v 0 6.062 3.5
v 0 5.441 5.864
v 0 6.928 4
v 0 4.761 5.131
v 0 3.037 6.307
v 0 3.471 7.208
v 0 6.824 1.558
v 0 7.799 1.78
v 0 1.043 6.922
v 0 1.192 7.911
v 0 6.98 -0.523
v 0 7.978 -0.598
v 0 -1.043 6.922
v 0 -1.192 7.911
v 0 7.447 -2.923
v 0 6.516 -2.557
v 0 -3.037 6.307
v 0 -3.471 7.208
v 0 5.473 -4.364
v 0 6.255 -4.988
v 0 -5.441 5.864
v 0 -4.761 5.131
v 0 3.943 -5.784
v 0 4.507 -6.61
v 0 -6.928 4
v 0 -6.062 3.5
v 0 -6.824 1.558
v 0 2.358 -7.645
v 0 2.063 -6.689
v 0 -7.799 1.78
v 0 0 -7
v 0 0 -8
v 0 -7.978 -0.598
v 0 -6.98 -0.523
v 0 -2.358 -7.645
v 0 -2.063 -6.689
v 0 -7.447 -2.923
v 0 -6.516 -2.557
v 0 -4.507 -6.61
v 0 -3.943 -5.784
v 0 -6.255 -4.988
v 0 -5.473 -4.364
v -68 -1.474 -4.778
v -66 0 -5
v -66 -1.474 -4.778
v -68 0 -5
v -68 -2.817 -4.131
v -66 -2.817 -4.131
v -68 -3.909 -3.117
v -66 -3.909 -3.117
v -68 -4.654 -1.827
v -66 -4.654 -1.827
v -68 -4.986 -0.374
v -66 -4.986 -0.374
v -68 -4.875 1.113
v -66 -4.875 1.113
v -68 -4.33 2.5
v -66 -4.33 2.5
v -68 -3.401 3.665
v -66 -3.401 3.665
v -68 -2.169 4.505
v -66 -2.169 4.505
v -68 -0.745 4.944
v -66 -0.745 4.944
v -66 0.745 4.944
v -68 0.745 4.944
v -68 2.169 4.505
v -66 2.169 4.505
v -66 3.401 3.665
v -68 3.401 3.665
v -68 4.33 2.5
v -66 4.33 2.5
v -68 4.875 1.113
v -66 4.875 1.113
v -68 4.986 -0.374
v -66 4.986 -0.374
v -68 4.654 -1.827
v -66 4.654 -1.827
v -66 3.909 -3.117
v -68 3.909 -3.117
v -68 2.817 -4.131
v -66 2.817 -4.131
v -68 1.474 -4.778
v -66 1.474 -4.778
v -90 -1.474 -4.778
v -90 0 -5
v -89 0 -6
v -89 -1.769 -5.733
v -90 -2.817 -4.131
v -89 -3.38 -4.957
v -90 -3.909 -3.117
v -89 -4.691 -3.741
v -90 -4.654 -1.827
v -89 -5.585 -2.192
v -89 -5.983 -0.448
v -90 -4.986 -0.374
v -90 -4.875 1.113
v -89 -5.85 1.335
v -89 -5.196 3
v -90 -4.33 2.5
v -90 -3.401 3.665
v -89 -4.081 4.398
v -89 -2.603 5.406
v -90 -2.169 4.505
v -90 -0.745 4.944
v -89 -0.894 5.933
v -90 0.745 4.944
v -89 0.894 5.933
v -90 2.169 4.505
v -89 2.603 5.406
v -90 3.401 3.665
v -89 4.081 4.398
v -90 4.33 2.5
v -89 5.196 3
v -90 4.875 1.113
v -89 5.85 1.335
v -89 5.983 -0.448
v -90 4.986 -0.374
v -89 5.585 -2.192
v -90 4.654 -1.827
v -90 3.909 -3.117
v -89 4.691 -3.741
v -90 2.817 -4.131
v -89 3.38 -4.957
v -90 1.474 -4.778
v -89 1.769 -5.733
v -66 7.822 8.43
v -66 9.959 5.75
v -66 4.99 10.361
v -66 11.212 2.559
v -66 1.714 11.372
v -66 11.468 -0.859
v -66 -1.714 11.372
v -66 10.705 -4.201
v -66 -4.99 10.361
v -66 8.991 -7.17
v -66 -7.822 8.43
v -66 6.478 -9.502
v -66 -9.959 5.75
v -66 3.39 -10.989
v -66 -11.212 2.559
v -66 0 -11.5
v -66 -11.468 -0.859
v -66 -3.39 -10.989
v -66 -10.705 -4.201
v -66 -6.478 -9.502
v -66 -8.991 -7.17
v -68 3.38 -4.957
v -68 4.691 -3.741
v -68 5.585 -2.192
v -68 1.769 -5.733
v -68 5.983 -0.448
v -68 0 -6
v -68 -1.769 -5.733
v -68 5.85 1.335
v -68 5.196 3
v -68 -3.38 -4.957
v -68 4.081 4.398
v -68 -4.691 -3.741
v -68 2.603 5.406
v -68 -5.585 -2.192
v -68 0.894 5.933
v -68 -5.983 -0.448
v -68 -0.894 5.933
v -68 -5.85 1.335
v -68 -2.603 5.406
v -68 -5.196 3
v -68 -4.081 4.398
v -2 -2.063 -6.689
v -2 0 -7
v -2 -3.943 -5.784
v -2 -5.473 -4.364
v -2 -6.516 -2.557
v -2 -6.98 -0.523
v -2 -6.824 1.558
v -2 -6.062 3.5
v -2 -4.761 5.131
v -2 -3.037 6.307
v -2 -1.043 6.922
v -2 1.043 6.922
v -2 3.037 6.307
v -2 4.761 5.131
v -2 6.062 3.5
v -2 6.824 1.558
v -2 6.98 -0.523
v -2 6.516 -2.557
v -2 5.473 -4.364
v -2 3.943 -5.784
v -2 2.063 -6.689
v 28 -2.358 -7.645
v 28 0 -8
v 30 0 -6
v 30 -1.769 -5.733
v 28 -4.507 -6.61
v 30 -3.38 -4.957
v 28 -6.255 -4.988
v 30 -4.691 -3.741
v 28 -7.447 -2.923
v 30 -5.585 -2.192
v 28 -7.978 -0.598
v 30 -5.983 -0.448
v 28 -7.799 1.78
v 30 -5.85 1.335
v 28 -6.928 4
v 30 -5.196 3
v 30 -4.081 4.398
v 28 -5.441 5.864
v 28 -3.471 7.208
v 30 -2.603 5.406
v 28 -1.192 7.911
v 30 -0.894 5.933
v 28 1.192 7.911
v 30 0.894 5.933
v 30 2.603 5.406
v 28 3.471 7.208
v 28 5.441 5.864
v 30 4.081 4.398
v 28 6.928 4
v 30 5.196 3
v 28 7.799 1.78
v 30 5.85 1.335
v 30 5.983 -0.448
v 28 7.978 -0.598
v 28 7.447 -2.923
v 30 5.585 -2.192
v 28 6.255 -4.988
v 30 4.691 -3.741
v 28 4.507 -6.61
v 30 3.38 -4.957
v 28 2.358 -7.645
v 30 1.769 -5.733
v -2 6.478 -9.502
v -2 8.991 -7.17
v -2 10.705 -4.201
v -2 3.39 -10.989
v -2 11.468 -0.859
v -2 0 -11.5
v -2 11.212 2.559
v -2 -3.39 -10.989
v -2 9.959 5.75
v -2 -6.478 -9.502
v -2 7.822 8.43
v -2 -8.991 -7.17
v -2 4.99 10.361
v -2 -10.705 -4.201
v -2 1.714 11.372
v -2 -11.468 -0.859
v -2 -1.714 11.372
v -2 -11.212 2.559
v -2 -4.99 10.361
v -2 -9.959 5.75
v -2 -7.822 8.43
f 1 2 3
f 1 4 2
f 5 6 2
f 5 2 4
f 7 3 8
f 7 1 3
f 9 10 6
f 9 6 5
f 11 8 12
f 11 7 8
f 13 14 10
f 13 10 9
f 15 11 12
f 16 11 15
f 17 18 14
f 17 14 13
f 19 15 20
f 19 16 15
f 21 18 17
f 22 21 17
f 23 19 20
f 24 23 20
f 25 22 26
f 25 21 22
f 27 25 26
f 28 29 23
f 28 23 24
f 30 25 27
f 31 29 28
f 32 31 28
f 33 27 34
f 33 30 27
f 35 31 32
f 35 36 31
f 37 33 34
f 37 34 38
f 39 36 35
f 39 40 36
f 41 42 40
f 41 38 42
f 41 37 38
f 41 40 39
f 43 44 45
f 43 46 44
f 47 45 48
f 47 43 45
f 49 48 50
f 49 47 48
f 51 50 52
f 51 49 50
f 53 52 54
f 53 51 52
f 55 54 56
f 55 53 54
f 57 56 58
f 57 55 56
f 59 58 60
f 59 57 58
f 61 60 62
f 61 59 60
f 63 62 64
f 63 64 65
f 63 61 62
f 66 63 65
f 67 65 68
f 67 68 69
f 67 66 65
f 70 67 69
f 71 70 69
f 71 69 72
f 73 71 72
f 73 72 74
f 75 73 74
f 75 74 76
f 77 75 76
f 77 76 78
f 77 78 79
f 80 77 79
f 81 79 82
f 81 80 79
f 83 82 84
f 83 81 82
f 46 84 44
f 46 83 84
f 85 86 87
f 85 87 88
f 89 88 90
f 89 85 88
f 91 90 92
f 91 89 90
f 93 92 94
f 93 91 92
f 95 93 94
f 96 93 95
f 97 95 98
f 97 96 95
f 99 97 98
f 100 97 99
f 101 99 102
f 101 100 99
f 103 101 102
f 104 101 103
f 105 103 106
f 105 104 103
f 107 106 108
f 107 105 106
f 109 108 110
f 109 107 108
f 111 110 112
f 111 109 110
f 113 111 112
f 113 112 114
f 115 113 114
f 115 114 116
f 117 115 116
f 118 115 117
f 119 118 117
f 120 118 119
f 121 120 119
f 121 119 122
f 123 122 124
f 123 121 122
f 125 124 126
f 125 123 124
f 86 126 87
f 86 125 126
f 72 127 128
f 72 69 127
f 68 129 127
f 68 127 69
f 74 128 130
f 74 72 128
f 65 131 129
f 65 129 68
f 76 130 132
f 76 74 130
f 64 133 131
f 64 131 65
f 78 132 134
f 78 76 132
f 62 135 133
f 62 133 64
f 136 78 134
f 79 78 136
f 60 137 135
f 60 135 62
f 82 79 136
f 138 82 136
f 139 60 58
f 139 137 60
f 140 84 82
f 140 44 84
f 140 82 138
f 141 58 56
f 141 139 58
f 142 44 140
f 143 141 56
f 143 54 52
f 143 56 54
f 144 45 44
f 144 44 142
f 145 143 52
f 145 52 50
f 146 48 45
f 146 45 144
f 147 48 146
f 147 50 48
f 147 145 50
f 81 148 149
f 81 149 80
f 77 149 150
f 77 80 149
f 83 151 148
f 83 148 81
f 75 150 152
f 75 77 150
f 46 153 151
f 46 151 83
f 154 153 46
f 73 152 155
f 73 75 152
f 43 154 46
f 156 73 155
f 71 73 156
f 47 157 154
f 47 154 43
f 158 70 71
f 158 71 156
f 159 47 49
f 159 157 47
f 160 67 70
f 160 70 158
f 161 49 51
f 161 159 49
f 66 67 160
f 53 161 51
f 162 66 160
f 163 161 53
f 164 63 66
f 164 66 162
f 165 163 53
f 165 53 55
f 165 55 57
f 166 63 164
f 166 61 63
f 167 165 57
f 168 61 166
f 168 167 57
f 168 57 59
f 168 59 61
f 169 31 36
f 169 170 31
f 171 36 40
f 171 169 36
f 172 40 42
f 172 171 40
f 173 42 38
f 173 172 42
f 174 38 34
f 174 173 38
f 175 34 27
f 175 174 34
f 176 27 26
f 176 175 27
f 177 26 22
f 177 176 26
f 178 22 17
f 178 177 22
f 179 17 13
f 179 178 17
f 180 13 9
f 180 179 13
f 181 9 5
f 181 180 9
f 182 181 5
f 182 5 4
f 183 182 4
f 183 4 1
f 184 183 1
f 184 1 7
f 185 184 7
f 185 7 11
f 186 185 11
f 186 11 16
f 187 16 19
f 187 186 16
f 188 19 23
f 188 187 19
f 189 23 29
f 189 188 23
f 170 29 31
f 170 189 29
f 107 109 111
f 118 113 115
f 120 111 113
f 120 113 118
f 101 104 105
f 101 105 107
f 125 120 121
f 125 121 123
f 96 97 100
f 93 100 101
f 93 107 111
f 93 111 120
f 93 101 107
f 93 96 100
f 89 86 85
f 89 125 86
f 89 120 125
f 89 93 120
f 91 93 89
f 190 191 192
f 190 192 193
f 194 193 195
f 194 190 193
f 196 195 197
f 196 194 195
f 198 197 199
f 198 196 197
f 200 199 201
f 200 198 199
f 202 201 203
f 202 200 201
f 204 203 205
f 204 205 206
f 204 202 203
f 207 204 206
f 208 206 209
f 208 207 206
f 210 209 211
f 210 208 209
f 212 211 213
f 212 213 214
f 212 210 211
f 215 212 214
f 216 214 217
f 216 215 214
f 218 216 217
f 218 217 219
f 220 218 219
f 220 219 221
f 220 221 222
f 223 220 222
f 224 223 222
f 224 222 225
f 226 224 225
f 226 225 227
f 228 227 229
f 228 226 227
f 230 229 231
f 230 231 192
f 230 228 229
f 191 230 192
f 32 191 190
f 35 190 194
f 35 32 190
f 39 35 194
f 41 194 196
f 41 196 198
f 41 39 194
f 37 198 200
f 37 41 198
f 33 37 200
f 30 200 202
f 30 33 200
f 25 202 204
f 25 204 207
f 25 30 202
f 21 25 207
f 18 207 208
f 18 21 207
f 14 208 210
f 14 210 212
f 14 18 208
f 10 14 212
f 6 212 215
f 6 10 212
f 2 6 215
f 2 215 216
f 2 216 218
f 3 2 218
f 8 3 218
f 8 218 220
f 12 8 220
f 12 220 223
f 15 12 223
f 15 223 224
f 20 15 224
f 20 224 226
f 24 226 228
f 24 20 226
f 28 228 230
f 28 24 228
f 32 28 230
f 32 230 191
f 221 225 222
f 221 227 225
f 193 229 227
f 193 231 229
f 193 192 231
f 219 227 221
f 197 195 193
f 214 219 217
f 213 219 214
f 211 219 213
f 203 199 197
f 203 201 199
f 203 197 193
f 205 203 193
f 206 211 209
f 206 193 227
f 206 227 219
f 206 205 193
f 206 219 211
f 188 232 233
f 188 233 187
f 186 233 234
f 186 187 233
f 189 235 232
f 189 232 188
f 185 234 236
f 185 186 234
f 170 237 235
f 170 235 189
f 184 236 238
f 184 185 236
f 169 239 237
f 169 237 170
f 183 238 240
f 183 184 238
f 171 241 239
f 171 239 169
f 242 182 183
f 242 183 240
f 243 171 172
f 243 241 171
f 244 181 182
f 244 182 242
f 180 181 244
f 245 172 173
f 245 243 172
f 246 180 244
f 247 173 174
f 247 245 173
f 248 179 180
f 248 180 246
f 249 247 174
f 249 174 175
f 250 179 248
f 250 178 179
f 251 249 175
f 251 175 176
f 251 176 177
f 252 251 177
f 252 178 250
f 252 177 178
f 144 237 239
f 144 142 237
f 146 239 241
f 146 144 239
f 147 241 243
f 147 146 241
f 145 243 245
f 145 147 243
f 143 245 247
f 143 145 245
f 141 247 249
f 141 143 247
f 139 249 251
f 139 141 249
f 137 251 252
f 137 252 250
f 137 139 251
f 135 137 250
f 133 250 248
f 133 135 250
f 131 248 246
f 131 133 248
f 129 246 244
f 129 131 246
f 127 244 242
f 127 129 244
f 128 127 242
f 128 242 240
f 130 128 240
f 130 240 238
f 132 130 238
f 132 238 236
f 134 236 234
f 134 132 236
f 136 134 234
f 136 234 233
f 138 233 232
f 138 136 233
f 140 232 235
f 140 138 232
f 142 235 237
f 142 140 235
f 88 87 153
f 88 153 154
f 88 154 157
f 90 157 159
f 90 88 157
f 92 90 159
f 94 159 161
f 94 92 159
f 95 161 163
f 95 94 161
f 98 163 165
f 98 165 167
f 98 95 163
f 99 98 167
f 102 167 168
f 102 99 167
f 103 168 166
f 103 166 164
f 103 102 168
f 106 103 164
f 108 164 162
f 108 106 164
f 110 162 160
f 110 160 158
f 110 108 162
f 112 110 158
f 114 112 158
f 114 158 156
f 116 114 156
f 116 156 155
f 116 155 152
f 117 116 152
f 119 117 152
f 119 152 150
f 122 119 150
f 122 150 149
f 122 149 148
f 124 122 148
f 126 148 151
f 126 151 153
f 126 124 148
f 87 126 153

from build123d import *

# Parameters (mm, degrees)
CHAMFER1_SIZE = 2
CHAMFER2_SIZE = 1


with BuildPart() as part:
    # Sketch1 → Revolve1 (revolve)
    with BuildSketch(Plane.XY, mode=Mode.PRIVATE) as revolve1_sk:
        Polygon((0, 0), (30, 0), (30, 8), (0, 8), (0, 7), (-2, 7), (-2, 11.5), (-66, 11.5), (-66, 5), (-68, 5), (-68, 6), (-90, 6), (-90, 0), (-68, 0), (-66, 0), (-2, 0), align=None)
    revolve(revolve1_sk.sketch.rotate(Axis((-68, 0, 0), (-1, 0, 0)), 90), axis=Axis((-68, 0, 0), (-1, 0, 0)))

    # Chamfer1
    chamfer1_edges = [part.edges().sort_by_distance(p)[0] for p in [
        (30, 0, 8),
    ]]
    chamfer(chamfer1_edges, length=CHAMFER1_SIZE)

    # Chamfer2
    chamfer2_edges = [part.edges().sort_by_distance(p)[0] for p in [
        (-90, 0, 6),
    ]]
    chamfer(chamfer2_edges, length=CHAMFER2_SIZE)


solid = part.part
